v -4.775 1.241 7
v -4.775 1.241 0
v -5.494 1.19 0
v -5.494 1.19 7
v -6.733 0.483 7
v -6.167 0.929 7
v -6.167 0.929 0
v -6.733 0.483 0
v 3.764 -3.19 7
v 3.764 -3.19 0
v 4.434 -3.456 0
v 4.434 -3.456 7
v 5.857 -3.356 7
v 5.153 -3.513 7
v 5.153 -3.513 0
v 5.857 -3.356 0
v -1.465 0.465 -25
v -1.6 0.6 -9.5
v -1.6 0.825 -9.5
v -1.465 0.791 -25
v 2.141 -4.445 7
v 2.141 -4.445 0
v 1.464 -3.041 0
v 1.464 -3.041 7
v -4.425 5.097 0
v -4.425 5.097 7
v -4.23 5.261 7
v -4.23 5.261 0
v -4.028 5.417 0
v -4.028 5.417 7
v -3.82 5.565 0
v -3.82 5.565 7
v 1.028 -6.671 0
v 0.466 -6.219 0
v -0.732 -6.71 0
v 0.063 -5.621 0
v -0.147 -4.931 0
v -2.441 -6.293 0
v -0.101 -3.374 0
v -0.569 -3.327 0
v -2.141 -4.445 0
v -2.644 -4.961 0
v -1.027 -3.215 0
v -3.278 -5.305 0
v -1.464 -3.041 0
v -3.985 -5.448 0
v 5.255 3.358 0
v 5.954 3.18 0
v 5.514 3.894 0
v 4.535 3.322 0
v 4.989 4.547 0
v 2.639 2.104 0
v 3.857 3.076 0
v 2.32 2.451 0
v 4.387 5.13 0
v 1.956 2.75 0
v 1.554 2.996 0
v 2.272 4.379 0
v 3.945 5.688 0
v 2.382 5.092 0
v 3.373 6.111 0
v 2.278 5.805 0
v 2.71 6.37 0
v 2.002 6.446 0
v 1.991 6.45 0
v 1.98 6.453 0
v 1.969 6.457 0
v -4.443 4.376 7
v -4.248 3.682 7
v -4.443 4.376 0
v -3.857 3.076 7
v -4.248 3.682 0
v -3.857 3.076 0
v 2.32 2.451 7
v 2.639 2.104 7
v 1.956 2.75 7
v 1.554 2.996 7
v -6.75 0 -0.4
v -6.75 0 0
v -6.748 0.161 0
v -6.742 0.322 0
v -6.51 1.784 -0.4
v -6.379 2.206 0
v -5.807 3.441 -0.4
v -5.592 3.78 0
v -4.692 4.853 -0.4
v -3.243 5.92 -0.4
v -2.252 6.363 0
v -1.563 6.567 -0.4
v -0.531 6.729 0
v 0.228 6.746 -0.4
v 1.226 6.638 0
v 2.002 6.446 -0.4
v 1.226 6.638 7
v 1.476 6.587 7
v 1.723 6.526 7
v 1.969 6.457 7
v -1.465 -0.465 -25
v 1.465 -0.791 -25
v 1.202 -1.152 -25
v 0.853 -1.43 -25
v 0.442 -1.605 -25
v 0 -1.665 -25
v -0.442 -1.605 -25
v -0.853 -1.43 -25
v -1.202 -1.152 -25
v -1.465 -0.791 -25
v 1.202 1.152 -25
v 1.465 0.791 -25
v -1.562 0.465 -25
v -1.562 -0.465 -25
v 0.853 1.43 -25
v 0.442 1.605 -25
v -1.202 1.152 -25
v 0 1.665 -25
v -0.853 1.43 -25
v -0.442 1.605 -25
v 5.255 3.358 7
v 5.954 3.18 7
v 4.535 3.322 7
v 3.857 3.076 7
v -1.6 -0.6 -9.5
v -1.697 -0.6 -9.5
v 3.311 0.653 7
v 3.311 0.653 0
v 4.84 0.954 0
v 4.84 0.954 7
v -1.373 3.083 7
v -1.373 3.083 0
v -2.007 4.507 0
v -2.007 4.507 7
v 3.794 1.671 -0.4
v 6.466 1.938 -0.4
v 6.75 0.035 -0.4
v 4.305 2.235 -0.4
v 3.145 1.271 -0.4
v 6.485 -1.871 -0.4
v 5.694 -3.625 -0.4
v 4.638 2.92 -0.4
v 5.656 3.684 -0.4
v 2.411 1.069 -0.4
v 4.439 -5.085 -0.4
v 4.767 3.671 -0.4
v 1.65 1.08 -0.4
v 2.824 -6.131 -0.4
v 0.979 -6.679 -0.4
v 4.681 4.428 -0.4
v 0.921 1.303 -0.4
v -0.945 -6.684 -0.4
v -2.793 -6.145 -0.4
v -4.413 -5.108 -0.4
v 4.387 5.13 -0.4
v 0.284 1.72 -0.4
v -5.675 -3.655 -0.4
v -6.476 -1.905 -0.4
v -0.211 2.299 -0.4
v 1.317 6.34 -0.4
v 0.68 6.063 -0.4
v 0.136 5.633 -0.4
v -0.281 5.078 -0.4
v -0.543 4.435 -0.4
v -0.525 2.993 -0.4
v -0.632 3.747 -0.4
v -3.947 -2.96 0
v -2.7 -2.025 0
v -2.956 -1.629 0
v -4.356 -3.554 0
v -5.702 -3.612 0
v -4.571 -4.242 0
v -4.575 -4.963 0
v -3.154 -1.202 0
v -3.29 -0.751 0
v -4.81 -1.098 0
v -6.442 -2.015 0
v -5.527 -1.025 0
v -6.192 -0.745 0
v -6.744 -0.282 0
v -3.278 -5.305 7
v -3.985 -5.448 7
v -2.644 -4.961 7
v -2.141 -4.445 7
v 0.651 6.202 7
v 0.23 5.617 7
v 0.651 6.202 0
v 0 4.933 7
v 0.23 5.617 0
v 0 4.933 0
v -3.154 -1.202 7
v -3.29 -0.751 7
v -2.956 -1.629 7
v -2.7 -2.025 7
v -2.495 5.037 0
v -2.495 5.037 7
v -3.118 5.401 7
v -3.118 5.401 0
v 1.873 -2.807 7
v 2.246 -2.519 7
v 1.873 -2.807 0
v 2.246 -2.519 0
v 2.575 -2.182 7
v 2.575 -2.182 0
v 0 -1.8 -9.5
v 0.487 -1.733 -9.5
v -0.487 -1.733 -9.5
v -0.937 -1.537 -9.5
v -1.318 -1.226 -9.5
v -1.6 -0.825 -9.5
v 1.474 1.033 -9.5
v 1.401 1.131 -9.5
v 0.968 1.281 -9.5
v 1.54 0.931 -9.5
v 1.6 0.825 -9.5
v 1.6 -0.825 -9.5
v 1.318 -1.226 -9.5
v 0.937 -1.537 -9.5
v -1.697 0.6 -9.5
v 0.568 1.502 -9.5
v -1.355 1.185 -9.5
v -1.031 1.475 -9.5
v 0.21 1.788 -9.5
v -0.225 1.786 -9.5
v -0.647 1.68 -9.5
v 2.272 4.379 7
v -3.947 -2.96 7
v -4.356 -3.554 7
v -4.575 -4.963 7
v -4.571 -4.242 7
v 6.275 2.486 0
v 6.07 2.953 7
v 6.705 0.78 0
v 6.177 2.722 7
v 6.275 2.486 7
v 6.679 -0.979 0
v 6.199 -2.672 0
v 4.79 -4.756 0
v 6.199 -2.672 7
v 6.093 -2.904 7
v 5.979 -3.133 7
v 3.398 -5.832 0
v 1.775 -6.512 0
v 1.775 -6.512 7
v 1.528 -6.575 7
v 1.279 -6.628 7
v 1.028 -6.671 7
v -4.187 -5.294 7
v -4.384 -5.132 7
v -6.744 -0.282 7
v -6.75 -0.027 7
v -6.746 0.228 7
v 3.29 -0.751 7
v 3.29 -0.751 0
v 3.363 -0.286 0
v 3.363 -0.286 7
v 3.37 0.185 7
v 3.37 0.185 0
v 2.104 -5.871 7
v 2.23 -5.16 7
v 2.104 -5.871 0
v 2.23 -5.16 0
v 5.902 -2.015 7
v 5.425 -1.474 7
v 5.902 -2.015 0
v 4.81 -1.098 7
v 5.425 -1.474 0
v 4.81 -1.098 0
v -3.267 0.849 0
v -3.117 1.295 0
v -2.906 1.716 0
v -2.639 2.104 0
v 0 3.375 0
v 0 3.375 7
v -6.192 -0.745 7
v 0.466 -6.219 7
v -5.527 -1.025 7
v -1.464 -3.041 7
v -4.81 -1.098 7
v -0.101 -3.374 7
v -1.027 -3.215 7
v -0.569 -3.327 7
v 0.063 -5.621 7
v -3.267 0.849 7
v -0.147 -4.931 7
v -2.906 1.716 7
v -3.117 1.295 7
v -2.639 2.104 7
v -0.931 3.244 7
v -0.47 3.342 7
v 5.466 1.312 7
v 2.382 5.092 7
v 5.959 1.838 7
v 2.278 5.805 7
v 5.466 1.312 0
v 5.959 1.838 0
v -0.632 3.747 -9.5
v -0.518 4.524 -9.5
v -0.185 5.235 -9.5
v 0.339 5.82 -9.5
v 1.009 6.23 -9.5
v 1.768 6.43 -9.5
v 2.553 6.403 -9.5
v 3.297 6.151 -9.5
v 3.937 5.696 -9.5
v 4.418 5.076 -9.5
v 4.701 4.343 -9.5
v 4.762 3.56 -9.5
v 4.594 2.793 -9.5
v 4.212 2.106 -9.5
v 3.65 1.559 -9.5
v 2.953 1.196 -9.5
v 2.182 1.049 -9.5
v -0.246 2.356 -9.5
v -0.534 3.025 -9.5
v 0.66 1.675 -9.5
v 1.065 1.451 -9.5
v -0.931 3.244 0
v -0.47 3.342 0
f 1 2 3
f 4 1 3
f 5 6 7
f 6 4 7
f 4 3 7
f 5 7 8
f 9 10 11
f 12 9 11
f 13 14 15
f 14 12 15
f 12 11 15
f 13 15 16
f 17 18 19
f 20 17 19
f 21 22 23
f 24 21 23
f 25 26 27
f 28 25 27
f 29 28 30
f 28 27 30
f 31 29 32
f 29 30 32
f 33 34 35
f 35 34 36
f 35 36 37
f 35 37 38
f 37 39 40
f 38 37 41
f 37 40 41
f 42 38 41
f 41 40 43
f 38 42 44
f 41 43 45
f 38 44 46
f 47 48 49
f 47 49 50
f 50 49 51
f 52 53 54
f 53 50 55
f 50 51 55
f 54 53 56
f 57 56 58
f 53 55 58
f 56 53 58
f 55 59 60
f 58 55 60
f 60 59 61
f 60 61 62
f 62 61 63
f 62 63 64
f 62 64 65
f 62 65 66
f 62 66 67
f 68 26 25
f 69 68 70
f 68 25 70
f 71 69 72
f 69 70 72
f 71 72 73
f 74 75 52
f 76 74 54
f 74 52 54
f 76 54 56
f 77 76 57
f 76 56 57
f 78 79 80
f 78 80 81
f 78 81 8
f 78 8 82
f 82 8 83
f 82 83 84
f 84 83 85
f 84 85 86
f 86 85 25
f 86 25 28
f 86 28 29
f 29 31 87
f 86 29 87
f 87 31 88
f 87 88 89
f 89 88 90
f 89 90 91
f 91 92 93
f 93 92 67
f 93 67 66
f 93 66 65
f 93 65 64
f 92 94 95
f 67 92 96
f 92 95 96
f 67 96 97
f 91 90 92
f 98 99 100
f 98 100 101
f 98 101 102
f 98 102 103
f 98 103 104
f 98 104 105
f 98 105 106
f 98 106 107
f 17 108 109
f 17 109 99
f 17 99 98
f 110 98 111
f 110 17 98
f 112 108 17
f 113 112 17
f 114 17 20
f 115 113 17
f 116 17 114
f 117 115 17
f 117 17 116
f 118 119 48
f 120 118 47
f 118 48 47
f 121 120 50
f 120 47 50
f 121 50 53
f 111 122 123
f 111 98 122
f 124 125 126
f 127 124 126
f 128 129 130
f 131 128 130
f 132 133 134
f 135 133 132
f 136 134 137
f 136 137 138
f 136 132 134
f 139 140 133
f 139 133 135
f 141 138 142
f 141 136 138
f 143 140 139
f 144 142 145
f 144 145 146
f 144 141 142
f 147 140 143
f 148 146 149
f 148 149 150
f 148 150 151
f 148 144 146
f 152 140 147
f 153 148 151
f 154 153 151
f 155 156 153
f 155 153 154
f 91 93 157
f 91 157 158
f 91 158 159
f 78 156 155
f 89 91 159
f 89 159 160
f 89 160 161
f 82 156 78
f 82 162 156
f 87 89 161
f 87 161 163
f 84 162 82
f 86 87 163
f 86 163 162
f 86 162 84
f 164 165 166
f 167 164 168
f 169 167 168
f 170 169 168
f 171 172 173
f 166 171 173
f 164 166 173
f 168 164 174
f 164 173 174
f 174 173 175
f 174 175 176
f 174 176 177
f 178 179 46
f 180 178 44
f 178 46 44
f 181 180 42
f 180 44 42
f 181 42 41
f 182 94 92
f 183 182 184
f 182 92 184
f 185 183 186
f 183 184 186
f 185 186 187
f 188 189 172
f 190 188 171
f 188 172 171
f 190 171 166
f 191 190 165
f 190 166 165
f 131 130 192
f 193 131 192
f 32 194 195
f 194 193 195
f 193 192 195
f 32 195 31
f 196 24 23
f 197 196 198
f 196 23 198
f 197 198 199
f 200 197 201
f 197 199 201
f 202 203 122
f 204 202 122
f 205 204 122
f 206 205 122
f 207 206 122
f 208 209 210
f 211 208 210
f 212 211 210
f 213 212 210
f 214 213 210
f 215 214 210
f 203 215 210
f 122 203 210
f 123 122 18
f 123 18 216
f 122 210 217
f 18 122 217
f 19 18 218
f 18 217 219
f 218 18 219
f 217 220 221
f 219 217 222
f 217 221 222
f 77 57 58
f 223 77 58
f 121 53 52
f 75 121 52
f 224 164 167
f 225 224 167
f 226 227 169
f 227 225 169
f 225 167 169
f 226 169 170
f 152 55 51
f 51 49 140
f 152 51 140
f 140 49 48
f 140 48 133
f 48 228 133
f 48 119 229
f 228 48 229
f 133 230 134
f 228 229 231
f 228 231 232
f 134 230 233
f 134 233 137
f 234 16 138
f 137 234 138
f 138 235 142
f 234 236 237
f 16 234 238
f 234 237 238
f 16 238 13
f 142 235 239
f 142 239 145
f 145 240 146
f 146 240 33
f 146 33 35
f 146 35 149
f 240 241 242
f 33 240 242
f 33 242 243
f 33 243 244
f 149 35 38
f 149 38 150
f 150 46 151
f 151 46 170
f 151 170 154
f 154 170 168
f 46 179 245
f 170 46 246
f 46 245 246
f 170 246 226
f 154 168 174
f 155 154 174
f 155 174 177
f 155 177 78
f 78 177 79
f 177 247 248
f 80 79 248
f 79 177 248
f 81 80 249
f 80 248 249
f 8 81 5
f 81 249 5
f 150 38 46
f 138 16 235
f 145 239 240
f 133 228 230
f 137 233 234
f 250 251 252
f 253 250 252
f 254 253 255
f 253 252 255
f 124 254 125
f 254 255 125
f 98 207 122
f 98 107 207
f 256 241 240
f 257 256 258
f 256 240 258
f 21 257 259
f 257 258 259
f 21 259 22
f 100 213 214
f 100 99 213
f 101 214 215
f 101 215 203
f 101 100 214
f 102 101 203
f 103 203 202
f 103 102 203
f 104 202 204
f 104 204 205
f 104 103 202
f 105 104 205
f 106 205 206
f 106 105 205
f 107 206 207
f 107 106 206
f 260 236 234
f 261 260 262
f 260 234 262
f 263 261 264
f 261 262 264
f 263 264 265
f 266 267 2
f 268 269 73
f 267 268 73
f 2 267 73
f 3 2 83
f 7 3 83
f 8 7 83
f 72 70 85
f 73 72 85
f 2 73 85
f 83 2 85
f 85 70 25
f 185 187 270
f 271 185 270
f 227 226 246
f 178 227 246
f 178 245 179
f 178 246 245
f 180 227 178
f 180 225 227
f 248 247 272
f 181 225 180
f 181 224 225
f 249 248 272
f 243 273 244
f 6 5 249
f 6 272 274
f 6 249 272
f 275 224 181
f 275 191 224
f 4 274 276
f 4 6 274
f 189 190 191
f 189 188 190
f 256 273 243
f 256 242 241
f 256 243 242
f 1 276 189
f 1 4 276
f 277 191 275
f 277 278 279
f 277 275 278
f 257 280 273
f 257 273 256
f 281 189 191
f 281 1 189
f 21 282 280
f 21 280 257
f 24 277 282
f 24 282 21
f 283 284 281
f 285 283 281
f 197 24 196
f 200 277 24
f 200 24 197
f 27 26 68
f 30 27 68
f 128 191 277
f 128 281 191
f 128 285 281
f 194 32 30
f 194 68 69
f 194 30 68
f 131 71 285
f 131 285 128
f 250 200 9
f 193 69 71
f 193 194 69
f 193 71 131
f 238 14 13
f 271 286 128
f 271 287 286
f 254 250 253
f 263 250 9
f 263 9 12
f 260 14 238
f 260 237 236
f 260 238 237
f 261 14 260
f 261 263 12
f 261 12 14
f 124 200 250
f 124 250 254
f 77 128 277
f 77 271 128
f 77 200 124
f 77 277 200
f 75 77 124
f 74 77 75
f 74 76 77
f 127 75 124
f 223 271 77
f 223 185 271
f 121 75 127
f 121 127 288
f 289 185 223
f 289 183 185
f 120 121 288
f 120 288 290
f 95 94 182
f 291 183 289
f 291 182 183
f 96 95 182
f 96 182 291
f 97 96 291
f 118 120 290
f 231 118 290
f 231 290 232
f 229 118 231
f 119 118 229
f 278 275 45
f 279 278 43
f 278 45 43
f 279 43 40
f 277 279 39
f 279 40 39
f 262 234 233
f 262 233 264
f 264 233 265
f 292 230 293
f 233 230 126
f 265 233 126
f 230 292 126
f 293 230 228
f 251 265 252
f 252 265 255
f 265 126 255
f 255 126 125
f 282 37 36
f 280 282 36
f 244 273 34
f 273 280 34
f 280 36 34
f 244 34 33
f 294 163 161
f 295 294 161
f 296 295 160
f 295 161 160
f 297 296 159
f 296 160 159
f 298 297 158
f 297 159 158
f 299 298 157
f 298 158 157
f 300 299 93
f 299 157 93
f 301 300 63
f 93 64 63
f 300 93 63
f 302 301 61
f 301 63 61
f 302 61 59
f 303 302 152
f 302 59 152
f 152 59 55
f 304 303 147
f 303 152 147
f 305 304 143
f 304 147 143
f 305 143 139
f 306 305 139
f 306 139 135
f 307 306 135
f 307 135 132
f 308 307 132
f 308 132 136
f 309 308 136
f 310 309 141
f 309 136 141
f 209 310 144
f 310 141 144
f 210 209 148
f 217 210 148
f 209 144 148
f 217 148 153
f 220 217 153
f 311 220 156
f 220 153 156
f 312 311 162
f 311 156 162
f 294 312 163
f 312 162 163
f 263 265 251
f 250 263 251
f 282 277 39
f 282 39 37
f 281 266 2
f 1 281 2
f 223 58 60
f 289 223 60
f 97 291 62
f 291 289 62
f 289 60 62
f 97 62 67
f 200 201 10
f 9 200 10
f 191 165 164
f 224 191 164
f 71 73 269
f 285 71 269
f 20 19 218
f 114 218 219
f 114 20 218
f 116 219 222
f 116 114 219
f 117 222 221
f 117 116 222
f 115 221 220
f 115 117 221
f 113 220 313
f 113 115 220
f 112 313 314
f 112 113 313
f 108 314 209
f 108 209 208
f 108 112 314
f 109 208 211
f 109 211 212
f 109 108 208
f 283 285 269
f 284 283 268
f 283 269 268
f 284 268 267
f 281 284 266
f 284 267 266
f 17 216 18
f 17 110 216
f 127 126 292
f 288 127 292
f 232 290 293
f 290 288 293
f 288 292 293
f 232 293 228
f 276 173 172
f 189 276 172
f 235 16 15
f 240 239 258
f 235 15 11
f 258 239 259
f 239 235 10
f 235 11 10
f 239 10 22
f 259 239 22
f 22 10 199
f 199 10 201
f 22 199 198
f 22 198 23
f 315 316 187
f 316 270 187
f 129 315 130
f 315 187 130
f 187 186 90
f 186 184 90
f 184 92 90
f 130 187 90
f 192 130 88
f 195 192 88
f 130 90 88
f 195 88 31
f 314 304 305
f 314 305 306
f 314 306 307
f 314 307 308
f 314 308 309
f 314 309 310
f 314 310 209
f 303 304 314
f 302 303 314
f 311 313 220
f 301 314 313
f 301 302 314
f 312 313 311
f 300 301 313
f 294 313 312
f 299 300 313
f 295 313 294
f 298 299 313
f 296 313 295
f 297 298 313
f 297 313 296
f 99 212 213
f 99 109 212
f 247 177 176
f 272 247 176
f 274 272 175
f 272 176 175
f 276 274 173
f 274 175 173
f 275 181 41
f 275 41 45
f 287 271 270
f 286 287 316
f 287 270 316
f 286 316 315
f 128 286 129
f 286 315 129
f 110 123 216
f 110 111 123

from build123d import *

# Parameters (mm, degrees)
SKETCH2_R                   = 6.75
GEAR_OUTSIDE_DIAMETER_DEPTH = 7
GEAR_TOOTH_CUT_DEPTH        = 8
GEAR_TEETH_COUNT            = 7
SKETCH3_R                   = 3.375
GEAR_DEDENDUM_CIRCLE_DEPTH  = 7
SKETCH8_R                   = 2.7
BOSS_EXTRUDE3_DEPTH         = 9.5
BOSS_EXTRUDE2_DEPTH         = 15.5
BOSS_EXTRUDE2_TAPER         = 0.5
SKETCH9_R                   = 6.75
BOSS_EXTRUDE4_DEPTH         = 0.4


with BuildPart() as part:
    # Sketch2 → gear outside diameter (new body)
    with BuildSketch(Plane.XY):
        Circle(SKETCH2_R)
    extrude(amount=GEAR_OUTSIDE_DIAMETER_DEPTH)

    # Sketch1 → gear tooth cut (cut, through all)
    with BuildSketch(Plane.XY):
        with BuildLine():
            Line((0, 4.933386259), (0, 3.375))
            ThreePointArc((0, 3.375), (-0.701885443, 3.301209146), (-1.373078899, 3.083063304))
            Line((-1.373078899, 3.083063304), (-2.007089948, 4.506649523))
            ThreePointArc((-2.007089948, 4.506649523), (-2.793182164, 5.242332608), (-3.820403893, 5.564801352))
            ThreePointArc((-3.820403893, 5.564801352), (-1.403770885, 6.602418292), (1.225966143, 6.637733575))
            ThreePointArc((1.225966143, 6.637733575), (0.41879145, 5.925245269), (0, 4.933386259))
        make_face()
    gear_tooth_cut = extrude(amount=GEAR_TOOTH_CUT_DEPTH, mode=Mode.SUBTRACT)

    # gear teeth: gear tooth cut ×7 about axis
    gear_teeth_axis = Axis((0, 0, 0), (0, 0, 1))
    for i in range(1, GEAR_TEETH_COUNT):
        add(gear_tooth_cut.rotate(gear_teeth_axis, i * 360 / GEAR_TEETH_COUNT), mode=Mode.SUBTRACT)

    # Sketch3 → gear dedendum circle (add)
    with BuildSketch(Plane.XY):
        Circle(SKETCH3_R)
    extrude(amount=GEAR_DEDENDUM_CIRCLE_DEPTH)

    # Sketch8 → Boss-Extrude3 (add)
    with BuildSketch(Plane(origin=(0, 0, 0), x_dir=(-1, 0, 0), z_dir=(0, 0, -1))):
        with Locations((-2.068006907, 3.746919537)):
            Circle(SKETCH8_R)
    extrude(amount=BOSS_EXTRUDE3_DEPTH)

    # Sketch6 → Boss-Extrude2 (add)
    with BuildSketch(Plane(origin=(0, 0, -9.5), x_dir=(-1, 0, 0), z_dir=(0, 0, -1))):
        with BuildLine():
            ThreePointArc((1.6, 0.824621125), (0, 1.8), (-1.6, 0.824621125))
            Line((-1.6, 0.824621125), (-1.6, -0.824621125))
            ThreePointArc((-1.6, -0.824621125), (0, -1.8), (1.6, -0.824621125))
            Line((1.6, -0.824621125), (1.6, -0.6))
            Line((1.6, -0.6), (1.697056275, -0.6))
            Line((1.697056275, -0.6), (1.697056275, 0.6))
            Line((1.697056275, 0.6), (1.6, 0.6))
            Line((1.6, 0.6), (1.6, 0.824621125))
        make_face()
    extrude(amount=BOSS_EXTRUDE2_DEPTH, taper=BOSS_EXTRUDE2_TAPER)

    # Sketch9 → Boss-Extrude4 (add)
    with BuildSketch(Plane(origin=(0, 0, 0), x_dir=(-1, 0, 0), z_dir=(0, 0, -1))):
        Circle(SKETCH9_R)
    extrude(amount=BOSS_EXTRUDE4_DEPTH)


solid = part.part
